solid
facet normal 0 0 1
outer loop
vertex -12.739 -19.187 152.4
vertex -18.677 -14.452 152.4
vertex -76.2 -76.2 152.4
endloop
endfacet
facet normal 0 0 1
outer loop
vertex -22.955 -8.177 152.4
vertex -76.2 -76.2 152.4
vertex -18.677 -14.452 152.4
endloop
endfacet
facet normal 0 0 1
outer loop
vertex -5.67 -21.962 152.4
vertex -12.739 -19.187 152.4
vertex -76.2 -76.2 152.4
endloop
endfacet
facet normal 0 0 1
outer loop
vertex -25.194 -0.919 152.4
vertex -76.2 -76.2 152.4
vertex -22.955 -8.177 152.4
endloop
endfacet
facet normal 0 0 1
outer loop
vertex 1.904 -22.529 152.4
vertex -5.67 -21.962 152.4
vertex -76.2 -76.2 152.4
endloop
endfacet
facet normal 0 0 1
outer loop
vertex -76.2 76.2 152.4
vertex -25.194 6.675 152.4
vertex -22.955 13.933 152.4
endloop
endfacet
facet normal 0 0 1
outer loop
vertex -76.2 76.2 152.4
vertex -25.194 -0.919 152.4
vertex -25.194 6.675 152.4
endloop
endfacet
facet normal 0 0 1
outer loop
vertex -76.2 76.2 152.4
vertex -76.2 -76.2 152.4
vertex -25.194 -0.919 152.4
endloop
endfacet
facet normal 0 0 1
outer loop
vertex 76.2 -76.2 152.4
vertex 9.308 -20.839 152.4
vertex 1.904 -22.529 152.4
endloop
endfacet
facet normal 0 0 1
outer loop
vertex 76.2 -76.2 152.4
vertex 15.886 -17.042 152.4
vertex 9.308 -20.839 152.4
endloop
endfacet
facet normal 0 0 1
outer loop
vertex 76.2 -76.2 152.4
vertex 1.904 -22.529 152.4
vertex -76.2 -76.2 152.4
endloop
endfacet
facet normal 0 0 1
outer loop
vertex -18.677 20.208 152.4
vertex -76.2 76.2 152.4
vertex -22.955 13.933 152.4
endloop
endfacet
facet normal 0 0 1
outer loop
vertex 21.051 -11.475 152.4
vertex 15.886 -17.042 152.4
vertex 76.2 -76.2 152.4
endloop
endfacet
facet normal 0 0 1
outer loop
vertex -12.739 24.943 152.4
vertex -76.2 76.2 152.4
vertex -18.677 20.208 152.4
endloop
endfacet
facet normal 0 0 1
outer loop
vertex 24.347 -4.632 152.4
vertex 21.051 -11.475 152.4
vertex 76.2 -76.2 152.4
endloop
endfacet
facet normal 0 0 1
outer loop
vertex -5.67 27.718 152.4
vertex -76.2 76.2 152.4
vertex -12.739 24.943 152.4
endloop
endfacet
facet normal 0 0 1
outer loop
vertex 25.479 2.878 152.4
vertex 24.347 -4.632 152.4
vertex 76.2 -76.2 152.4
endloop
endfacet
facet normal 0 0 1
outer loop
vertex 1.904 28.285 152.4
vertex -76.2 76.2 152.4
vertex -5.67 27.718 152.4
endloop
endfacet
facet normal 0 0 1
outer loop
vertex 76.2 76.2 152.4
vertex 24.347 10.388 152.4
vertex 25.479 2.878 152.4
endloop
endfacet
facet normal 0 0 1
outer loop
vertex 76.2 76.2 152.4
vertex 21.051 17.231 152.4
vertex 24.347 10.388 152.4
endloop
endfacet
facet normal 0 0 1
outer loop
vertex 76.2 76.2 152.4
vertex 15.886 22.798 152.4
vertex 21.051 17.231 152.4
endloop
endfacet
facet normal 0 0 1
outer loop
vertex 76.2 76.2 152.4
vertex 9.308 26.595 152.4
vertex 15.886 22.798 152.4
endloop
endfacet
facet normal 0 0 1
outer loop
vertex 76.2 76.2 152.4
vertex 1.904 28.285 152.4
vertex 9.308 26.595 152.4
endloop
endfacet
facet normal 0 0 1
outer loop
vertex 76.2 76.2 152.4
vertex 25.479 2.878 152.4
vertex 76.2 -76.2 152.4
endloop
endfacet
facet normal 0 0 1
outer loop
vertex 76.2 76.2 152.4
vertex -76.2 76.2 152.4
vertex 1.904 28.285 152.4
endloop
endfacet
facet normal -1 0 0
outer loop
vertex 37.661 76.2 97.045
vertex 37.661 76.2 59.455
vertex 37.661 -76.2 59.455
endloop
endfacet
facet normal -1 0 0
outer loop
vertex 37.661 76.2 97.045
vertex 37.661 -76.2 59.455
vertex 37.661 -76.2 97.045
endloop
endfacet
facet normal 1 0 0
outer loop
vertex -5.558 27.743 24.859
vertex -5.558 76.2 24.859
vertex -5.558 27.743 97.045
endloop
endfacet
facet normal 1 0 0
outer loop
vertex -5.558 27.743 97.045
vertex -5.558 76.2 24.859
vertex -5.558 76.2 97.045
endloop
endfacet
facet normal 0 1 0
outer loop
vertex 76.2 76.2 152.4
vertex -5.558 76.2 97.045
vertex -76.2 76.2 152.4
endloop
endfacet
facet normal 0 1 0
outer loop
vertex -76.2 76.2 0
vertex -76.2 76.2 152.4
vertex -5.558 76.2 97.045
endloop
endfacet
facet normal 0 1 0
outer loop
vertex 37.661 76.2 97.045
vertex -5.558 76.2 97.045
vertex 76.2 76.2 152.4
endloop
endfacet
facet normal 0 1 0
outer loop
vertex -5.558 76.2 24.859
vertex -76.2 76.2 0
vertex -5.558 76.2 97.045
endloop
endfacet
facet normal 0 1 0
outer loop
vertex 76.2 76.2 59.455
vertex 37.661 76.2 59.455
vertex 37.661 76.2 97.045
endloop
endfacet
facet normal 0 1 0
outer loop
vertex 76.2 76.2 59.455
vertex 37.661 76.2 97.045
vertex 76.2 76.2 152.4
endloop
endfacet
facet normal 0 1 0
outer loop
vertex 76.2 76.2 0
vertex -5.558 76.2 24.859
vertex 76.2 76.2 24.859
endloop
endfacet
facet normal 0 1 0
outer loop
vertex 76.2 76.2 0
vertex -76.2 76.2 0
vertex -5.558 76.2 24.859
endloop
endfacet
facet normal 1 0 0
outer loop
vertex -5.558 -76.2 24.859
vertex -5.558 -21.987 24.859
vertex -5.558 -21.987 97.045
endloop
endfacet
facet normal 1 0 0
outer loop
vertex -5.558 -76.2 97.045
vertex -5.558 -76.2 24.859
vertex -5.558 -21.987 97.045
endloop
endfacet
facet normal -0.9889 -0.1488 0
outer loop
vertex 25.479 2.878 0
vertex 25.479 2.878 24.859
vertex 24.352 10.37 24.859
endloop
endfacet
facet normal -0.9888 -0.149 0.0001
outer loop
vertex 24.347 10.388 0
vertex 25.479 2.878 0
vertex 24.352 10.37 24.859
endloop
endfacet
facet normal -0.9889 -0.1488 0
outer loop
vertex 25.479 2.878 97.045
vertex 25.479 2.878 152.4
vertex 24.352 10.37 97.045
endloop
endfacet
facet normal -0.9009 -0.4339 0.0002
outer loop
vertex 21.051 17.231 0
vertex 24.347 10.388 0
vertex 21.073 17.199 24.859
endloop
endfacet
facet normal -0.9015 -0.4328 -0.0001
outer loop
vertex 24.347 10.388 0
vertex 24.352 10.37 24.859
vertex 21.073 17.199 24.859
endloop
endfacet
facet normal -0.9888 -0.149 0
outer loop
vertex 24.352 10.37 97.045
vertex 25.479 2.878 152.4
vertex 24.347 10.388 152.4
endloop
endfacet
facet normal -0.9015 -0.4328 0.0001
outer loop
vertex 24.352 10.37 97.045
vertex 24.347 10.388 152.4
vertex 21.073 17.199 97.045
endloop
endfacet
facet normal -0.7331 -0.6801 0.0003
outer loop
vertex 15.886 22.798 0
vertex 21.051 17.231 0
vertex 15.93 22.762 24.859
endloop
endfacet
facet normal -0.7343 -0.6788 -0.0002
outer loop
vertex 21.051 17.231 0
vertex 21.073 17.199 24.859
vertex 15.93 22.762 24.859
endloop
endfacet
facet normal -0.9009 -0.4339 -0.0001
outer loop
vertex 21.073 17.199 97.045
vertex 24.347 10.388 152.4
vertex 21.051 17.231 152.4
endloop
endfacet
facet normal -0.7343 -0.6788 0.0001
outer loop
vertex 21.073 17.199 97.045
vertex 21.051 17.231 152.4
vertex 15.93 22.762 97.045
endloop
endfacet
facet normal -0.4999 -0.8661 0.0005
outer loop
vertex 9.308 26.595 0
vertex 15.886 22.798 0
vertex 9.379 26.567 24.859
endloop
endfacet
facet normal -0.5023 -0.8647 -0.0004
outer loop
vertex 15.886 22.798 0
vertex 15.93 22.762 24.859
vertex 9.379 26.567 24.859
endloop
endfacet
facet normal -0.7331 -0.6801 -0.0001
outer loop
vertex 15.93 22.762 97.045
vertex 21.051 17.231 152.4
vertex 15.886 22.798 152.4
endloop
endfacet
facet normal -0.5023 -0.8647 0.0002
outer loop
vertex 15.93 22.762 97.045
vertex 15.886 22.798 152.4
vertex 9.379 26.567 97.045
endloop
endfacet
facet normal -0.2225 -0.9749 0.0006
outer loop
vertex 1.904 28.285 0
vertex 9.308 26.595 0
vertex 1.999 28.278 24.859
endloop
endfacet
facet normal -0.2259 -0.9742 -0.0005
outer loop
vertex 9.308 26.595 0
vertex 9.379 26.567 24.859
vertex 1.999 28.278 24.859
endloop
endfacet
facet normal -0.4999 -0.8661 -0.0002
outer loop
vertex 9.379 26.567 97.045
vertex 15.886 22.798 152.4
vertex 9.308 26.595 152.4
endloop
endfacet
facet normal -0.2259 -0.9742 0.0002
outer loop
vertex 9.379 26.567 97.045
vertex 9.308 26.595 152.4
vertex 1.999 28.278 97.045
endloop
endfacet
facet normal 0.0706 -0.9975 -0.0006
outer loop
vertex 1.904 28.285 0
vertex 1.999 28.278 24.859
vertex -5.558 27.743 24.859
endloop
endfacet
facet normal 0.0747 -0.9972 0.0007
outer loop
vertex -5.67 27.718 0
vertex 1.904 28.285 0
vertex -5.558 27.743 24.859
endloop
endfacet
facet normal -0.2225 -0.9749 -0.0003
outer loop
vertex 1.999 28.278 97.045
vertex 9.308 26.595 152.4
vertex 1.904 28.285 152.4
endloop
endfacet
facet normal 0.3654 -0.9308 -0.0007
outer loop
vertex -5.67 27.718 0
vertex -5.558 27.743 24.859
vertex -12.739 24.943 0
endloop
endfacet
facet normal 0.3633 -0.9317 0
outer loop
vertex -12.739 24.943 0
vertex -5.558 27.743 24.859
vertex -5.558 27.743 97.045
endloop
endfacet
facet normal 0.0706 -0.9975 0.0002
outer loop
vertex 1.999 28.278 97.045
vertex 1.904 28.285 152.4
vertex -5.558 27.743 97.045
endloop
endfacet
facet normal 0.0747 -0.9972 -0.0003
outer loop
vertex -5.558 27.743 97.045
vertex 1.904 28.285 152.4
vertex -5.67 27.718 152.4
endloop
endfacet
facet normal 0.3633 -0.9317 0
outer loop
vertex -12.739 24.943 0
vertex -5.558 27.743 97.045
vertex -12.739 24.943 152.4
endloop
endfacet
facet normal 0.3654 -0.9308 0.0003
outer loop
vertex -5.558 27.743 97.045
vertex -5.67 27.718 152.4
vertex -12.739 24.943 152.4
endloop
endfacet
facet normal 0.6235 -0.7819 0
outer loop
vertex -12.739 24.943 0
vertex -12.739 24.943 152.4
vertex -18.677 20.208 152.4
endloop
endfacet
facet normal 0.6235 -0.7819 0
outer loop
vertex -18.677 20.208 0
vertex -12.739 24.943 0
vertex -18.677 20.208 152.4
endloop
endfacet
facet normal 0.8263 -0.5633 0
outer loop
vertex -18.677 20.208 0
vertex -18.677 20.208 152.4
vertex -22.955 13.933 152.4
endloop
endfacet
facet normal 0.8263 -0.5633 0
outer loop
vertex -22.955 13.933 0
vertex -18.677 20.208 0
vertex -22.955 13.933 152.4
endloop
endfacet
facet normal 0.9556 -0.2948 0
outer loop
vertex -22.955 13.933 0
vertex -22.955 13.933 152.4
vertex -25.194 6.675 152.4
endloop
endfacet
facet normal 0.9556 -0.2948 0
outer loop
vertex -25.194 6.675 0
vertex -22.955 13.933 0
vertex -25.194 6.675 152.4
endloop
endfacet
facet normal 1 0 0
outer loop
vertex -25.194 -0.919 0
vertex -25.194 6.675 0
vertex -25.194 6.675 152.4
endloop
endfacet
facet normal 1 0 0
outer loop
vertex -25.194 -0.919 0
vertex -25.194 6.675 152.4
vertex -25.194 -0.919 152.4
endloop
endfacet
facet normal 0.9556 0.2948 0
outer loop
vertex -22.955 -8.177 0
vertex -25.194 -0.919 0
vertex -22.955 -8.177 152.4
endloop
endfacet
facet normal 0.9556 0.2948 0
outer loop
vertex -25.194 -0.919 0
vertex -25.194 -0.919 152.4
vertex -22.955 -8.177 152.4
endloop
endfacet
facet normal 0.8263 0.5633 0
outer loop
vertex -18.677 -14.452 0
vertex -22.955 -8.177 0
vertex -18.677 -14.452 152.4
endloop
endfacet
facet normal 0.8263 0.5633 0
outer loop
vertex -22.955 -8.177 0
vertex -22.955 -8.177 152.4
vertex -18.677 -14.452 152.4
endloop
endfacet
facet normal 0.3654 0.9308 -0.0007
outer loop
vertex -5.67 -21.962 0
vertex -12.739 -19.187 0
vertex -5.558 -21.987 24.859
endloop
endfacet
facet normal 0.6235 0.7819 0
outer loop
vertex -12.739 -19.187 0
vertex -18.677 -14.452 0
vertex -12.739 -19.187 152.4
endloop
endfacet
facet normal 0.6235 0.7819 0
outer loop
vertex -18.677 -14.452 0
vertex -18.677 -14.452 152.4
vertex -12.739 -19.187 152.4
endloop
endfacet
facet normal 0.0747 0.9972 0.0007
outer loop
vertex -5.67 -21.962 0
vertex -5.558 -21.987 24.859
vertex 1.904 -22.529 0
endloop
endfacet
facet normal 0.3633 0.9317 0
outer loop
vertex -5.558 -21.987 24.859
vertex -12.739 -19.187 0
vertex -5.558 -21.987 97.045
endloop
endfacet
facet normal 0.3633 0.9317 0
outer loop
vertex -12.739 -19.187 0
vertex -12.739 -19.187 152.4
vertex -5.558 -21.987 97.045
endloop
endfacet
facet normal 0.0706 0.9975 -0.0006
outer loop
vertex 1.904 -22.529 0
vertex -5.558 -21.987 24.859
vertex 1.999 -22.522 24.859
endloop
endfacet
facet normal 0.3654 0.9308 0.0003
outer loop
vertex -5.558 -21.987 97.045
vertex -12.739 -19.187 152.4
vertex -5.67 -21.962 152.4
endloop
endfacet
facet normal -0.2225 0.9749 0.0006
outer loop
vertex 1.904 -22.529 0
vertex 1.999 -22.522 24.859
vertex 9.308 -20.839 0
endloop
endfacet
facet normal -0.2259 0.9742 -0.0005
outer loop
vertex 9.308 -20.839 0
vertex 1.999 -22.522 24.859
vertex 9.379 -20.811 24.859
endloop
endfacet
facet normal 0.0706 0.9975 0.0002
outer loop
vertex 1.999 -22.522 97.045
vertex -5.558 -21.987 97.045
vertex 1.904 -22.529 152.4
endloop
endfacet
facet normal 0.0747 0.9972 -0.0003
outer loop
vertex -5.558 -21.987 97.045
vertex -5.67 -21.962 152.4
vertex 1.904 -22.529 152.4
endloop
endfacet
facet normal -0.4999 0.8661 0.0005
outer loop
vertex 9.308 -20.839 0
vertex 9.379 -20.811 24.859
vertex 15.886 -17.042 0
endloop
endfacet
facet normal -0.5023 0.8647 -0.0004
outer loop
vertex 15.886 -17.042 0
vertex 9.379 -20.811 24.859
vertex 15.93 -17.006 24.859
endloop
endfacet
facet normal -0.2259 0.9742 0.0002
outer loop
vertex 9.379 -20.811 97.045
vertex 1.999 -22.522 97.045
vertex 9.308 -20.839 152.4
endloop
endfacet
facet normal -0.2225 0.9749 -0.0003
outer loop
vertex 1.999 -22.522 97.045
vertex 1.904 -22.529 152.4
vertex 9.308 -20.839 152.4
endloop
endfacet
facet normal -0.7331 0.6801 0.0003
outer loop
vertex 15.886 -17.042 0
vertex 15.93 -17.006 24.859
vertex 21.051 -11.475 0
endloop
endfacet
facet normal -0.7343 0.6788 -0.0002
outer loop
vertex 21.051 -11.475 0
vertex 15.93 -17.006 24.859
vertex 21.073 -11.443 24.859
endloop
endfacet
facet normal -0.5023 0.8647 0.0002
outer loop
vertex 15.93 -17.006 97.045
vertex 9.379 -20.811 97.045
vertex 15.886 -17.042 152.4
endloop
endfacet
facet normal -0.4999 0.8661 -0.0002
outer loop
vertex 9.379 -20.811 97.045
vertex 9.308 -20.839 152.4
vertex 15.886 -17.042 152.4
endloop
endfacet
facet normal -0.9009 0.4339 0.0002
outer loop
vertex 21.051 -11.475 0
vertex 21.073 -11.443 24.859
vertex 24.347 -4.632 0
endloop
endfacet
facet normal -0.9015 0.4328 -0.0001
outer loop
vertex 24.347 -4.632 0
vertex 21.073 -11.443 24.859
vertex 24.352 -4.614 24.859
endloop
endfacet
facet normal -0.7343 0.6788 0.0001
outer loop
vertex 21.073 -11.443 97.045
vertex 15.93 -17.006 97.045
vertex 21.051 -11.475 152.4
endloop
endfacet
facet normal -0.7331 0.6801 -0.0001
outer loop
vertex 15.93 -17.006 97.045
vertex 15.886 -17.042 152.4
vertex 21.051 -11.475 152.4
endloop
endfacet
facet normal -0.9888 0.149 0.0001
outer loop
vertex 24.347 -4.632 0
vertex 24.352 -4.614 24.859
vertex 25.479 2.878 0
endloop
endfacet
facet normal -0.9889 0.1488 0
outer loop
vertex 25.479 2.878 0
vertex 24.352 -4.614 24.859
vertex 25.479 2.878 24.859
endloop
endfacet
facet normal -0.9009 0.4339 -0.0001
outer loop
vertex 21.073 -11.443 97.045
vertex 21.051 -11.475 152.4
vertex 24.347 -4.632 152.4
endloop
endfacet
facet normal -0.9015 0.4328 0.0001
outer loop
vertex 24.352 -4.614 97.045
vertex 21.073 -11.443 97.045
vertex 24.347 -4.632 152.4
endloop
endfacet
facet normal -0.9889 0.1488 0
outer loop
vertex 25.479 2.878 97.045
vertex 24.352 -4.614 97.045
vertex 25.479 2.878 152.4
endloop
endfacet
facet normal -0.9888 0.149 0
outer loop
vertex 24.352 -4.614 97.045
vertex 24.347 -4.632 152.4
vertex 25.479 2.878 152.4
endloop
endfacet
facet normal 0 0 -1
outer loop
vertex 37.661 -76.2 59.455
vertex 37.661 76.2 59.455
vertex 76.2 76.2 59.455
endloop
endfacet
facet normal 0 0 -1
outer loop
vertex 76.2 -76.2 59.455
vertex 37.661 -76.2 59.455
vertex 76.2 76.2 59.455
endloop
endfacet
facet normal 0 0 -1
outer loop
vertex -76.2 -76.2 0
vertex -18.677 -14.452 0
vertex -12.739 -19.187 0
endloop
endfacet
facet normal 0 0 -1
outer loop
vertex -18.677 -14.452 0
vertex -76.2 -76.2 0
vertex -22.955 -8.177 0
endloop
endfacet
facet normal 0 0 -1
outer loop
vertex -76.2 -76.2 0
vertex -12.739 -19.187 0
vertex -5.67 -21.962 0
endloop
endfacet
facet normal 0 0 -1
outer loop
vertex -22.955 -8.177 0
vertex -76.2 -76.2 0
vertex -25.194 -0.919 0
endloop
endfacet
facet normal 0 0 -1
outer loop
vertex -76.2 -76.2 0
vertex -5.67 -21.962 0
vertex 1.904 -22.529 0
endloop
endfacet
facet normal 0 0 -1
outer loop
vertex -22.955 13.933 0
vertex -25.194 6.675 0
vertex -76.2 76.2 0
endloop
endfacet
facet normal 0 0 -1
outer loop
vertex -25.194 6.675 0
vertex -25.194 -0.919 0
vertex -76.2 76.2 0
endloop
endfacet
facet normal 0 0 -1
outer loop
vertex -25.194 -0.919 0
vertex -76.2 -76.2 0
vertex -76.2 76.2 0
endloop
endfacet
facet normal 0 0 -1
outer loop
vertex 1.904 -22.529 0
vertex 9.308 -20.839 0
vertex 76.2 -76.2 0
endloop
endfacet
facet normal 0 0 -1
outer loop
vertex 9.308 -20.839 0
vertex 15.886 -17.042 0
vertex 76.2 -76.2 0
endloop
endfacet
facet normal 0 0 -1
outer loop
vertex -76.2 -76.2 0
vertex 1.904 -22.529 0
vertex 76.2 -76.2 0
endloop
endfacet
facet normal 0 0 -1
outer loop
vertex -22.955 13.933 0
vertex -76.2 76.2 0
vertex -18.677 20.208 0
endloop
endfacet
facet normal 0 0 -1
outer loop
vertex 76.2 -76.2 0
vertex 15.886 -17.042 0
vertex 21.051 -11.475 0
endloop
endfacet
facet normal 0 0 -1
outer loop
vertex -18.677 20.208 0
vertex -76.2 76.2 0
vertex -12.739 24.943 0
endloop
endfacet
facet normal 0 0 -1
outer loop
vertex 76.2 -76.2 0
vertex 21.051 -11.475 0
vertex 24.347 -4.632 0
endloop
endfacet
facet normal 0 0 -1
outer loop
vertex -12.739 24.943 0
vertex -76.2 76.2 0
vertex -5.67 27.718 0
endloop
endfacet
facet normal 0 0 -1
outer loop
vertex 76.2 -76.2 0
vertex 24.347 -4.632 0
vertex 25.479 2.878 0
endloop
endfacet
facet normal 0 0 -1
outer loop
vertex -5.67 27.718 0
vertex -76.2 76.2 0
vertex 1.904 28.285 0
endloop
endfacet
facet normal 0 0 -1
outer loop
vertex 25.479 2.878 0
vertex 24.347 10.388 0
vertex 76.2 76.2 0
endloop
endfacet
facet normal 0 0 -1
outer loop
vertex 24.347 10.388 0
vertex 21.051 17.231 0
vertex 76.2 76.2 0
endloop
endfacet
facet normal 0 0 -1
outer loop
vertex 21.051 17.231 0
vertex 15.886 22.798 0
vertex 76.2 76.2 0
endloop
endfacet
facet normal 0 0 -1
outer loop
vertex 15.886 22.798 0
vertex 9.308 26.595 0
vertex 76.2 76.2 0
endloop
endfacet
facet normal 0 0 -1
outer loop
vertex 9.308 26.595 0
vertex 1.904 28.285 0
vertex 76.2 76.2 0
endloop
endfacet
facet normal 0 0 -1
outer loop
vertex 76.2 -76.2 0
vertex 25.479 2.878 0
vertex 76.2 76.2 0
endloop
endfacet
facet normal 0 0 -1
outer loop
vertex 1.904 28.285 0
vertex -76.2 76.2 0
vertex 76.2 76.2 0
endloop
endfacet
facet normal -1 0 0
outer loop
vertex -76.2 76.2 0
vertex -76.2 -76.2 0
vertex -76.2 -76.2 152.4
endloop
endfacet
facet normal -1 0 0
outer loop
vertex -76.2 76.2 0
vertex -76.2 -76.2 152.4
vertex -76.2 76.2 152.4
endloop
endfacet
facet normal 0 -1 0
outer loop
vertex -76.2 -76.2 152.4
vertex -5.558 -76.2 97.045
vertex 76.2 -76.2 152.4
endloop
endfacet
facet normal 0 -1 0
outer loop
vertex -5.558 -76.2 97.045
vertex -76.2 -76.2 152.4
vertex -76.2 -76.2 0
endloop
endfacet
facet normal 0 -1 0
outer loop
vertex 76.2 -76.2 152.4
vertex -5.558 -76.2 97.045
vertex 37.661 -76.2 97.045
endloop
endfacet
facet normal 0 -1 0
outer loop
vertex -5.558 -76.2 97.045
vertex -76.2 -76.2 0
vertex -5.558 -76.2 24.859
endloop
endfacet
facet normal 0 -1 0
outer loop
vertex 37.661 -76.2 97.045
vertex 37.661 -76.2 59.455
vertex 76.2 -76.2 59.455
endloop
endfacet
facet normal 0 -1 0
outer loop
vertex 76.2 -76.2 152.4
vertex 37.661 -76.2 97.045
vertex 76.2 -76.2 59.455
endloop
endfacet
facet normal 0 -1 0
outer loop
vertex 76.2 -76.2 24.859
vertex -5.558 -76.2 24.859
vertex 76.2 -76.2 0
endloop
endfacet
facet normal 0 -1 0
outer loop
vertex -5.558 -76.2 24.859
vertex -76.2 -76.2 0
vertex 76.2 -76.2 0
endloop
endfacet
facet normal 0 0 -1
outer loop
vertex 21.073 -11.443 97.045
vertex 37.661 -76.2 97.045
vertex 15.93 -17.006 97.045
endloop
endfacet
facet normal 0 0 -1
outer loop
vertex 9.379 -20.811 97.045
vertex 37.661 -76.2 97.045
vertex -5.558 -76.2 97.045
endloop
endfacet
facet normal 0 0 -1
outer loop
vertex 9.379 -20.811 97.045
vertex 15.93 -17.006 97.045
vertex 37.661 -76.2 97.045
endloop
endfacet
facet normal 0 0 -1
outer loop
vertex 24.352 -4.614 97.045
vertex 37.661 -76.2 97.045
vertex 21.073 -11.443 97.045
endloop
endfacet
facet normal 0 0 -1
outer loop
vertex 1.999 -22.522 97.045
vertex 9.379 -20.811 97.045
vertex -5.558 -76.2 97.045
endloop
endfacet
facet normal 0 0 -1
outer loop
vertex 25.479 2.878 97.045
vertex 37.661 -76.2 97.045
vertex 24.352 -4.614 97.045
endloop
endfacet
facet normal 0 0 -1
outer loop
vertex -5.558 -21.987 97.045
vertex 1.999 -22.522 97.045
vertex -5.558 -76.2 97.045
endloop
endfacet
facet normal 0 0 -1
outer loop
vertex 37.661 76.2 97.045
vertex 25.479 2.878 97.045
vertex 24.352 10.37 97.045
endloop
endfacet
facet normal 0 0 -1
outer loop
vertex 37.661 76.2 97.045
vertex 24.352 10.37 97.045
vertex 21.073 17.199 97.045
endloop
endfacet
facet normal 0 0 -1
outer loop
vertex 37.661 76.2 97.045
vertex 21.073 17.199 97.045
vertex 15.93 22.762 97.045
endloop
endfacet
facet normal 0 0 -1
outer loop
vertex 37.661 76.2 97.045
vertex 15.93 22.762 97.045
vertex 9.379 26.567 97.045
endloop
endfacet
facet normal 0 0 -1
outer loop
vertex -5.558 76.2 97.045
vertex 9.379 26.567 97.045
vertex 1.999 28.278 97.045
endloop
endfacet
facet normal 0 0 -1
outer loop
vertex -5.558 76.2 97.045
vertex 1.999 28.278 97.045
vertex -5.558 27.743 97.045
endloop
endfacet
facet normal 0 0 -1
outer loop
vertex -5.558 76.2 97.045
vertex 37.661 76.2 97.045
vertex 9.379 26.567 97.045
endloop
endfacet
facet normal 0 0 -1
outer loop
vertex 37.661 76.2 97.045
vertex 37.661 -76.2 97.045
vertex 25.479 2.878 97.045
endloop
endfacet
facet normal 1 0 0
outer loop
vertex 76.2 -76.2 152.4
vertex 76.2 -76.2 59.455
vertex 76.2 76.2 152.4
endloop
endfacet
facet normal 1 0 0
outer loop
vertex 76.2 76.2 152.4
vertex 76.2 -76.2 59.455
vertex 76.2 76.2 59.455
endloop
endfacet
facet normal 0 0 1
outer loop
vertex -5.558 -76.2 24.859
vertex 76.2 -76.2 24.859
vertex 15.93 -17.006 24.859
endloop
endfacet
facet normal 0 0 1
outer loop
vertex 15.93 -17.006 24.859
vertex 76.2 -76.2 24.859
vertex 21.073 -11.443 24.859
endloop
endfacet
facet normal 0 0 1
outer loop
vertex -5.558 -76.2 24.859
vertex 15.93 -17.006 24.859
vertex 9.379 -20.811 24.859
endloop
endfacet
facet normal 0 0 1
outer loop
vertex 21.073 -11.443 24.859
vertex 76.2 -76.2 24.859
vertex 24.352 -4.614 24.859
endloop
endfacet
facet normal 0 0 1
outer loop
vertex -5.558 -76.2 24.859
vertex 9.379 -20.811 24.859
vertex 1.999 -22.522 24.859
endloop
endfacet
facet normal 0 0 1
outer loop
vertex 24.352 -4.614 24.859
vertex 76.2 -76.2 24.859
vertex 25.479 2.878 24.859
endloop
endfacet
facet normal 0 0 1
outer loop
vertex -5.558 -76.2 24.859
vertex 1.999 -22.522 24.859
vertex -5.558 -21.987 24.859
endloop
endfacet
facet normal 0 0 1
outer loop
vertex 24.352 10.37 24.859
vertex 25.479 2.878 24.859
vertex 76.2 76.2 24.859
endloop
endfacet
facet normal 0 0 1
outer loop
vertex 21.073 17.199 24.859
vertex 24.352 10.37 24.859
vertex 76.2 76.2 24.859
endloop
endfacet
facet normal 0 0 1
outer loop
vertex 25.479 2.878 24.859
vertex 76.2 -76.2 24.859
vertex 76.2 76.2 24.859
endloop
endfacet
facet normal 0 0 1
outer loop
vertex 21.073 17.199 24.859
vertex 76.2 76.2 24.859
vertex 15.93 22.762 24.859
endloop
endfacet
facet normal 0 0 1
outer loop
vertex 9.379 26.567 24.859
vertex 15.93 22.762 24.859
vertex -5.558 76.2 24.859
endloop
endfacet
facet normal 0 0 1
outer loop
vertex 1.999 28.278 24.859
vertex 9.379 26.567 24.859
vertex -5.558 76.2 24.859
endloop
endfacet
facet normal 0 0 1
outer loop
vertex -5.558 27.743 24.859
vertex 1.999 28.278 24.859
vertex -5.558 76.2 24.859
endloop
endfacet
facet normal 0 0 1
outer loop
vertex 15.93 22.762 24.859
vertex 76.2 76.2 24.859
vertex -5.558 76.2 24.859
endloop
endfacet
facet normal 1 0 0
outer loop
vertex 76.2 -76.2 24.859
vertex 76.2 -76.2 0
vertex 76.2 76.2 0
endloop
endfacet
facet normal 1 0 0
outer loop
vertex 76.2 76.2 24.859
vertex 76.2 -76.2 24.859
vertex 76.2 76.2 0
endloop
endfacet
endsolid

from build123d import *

# Parameters (mm, degrees)
F0_W     = 152.4
F0_H     = 152.4
F1_DEPTH = 152.4
F2_R     = 25.478532
F3_DEPTH = 152.4
F4_W     = 43.219294
F4_H     = 37.589584
F5_DEPTH = 152.4


with BuildPart() as f1:
    # F0 (on Top) → F1 (new body)
    with BuildSketch(Plane.XY):
        Rectangle(F0_W, F0_H)
    extrude(amount=F1_DEPTH)

    # F2 (on face) → F3 (cut)
    with BuildSketch(Plane.XY.offset(152.4)):
        with Locations((0, 2.878058)):
            Circle(F2_R)
    extrude(amount=-F3_DEPTH, mode=Mode.SUBTRACT)

    # F4 (on face) → F5 (cut)
    with BuildSketch(Plane(origin=(0, 76.2, 0), x_dir=(-1, 0, 0), z_dir=(0, 1, 0))):
        with Locations((-16.05138, 78.249803)):
            Rectangle(F4_W, F4_H)
        Polygon((5.558267, 59.455011), (-37.661027, 59.455011), (-76.2, 59.455011), (-76.2, 24.858916), (5.558267, 24.858916), align=None)
    extrude(amount=-F5_DEPTH, mode=Mode.SUBTRACT)


solid = f1.part
